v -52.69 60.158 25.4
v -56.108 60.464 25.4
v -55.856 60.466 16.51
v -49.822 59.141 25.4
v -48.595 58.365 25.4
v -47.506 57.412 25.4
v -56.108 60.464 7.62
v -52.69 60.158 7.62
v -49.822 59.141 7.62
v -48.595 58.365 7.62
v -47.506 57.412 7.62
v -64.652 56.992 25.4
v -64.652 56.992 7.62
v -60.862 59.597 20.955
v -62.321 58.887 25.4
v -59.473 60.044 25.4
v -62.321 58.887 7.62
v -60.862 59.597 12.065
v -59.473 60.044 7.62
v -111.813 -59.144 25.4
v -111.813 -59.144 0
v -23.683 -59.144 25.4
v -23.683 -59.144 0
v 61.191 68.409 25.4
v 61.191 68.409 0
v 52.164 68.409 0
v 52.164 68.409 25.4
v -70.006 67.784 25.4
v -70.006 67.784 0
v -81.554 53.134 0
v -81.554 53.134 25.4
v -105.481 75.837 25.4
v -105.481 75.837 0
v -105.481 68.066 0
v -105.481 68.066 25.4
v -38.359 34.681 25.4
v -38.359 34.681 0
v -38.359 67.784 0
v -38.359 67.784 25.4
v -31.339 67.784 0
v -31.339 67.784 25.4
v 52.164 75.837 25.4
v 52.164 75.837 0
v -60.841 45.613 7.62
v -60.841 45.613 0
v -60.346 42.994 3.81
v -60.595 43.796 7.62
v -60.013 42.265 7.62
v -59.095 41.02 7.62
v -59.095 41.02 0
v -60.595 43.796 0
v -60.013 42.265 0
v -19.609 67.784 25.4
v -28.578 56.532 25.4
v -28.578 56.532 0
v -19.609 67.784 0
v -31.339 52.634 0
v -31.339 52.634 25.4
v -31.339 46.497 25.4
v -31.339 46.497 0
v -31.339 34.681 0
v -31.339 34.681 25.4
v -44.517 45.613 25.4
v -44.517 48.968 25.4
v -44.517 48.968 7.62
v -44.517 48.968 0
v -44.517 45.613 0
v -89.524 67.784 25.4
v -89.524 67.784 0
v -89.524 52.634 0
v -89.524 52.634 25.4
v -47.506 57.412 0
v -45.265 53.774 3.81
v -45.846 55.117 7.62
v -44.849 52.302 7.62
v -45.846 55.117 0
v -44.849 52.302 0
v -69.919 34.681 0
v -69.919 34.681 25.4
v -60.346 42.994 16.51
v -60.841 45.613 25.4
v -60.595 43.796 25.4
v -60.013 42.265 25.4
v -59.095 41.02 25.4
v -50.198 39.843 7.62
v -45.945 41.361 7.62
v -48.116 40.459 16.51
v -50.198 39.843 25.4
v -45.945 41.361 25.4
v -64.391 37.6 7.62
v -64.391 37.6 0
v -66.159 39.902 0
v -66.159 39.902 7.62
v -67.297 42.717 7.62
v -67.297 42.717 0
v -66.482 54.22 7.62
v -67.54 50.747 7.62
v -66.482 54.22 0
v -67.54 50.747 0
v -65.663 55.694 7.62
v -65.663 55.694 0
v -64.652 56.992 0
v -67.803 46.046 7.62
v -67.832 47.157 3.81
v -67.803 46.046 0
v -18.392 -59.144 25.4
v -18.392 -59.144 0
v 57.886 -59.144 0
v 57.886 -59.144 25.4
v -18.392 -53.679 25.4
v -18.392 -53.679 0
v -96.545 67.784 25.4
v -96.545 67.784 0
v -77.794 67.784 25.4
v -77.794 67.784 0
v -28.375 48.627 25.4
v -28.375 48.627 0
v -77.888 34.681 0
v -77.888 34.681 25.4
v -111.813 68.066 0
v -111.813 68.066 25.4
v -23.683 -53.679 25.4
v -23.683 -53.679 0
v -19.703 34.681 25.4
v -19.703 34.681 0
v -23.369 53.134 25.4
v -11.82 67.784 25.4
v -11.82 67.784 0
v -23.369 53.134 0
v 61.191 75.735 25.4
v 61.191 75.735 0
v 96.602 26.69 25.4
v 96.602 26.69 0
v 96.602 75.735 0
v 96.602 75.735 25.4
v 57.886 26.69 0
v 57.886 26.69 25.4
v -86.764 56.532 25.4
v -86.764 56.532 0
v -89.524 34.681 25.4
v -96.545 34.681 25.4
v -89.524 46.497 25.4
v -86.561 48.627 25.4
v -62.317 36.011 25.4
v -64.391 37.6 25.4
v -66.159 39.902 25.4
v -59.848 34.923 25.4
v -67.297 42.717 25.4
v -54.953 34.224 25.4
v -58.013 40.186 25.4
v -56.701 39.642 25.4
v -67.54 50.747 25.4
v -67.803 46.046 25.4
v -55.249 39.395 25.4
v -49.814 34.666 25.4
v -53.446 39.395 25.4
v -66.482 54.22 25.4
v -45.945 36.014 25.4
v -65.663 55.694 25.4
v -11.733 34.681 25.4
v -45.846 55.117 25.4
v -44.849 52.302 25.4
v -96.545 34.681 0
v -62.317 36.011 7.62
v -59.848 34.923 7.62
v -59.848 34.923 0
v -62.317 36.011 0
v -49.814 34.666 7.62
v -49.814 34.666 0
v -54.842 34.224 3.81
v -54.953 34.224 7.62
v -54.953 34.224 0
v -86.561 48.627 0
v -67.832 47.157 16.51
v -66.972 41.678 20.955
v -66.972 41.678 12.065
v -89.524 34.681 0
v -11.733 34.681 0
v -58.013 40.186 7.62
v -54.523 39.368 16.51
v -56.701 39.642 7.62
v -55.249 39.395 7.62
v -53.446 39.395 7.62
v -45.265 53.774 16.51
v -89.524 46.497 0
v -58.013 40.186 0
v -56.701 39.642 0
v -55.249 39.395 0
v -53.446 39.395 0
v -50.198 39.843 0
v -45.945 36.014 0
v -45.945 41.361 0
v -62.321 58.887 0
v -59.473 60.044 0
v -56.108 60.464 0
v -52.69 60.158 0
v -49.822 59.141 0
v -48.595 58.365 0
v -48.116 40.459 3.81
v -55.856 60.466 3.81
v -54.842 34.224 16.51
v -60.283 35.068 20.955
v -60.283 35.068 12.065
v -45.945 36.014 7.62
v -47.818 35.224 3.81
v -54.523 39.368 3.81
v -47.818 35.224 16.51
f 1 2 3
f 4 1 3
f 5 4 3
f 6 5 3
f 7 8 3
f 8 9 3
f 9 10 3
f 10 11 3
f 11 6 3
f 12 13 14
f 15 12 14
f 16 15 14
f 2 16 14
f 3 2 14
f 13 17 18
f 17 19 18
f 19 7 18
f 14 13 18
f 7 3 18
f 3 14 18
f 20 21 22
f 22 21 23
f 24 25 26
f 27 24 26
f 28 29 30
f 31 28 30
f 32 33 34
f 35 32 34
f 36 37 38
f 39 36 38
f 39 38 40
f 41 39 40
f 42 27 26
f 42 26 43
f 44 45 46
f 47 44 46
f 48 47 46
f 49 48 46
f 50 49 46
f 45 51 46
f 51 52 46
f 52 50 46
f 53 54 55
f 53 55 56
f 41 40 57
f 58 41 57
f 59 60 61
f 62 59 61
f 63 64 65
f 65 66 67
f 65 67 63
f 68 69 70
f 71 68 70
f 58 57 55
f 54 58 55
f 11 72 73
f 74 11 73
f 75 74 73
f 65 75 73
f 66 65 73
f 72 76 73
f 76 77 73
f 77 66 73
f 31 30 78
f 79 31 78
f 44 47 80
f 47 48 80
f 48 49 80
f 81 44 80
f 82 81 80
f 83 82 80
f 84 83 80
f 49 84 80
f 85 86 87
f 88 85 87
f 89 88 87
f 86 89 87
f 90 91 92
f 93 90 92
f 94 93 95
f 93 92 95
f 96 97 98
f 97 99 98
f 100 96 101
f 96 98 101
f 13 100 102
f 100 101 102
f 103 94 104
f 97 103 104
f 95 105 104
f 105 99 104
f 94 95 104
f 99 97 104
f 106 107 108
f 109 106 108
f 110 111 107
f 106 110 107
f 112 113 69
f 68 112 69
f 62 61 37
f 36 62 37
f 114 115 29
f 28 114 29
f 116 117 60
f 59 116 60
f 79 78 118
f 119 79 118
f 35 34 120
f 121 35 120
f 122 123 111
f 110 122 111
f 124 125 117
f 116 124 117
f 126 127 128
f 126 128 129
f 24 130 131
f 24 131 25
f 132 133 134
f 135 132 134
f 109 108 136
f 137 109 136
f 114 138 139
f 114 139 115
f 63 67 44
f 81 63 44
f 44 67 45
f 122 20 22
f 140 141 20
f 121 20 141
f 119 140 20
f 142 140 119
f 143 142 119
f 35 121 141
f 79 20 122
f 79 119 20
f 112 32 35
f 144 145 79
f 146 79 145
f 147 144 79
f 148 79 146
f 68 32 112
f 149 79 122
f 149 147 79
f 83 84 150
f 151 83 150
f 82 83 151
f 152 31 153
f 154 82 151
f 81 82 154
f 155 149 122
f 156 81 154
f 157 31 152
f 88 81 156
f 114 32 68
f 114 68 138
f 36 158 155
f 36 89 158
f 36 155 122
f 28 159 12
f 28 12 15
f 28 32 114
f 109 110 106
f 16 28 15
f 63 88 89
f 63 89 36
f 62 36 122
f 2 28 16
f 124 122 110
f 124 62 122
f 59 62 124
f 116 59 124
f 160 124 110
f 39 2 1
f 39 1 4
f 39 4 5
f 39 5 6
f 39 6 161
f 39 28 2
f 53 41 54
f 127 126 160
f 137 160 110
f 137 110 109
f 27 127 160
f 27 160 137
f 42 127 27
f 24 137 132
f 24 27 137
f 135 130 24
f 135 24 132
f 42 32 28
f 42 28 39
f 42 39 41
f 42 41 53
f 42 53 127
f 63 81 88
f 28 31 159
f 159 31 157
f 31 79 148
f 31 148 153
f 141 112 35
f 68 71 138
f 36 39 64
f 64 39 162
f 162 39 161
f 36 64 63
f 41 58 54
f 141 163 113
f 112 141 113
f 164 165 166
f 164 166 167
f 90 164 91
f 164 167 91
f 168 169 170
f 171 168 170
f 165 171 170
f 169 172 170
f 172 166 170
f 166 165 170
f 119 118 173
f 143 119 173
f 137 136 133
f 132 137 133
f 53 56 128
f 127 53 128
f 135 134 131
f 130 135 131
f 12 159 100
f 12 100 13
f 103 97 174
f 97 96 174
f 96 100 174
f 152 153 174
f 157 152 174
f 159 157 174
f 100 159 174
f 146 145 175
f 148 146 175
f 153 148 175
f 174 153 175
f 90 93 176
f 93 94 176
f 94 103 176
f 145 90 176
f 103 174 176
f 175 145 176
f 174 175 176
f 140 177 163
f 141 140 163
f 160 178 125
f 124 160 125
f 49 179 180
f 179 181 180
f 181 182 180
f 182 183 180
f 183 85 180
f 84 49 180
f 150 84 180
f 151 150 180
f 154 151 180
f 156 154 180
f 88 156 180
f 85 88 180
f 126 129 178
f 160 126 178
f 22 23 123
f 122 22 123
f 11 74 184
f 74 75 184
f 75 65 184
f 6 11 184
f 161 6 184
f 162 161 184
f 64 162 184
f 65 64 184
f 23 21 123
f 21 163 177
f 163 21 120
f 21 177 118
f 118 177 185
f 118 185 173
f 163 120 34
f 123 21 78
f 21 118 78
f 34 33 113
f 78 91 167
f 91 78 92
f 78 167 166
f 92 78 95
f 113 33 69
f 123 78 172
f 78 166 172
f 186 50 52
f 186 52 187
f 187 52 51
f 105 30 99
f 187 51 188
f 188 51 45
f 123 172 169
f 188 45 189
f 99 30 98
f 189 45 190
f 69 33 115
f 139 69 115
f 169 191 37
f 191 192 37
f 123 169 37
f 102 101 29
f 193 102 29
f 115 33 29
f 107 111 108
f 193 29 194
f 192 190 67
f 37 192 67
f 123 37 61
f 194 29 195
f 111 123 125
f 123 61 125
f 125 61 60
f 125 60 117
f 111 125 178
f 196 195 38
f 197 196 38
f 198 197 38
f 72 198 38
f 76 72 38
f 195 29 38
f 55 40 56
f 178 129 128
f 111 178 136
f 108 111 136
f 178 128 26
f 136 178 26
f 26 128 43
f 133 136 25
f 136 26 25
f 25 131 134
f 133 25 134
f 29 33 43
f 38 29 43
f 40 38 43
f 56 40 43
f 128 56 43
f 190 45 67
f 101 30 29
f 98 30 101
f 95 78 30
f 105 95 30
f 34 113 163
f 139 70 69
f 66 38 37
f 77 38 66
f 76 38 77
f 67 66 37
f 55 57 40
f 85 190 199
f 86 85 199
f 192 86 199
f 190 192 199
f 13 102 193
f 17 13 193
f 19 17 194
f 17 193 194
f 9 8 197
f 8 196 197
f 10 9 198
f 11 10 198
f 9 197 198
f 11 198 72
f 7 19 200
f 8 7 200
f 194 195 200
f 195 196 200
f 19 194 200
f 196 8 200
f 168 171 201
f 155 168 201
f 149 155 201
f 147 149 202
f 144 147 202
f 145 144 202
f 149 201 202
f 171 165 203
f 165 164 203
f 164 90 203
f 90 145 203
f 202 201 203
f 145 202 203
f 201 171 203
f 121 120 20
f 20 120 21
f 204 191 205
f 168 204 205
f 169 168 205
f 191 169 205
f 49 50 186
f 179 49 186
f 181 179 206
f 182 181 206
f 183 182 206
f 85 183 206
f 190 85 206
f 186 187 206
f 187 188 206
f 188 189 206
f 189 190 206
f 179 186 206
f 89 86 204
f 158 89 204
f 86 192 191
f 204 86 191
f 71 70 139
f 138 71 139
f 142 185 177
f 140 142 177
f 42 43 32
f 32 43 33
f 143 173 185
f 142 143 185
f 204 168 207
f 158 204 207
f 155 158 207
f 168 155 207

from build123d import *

# Parameters (mm, degrees)
F1_DEPTH = 7.62
F2_DEPTH = 25.4


with BuildPart() as f1:
    # F0 (on Top) → F1 (new body)
    with BuildSketch(Plane.XY):
        Polygon((-105.48081249, 68.0660605431), (-111.8125319481, 68.0660605431), (-111.8125319481, -59.1440834105), (-23.6834976822, -59.1440834105), (-23.6834976822, -53.6785013974), (-18.3922555298, -53.6785013974), (-18.3922555298, -59.1440834105), (57.8856468201, -59.1440834105), (57.8856468201, 26.6896747053), (96.6019257903, 26.6896747053), (96.6019257903, 75.7354423404), (61.1912831664, 75.7354423404), (61.1912831664, 68.4091001749), (52.1640814841, 68.4091001749), (52.1640814841, 75.83681494), (-105.48081249, 75.83681494), align=None)
        Polygon((-81.554395719, 53.1338888759), (-69.9187490924, 34.6805937588), (-77.8883700696, 34.6805937588), (-86.5607667147, 48.6274304688), (-89.5240166962, 46.4973681349), (-89.5240166962, 34.6805937588), (-96.544528266, 34.6805937588), (-96.544528266, 67.7835012539), (-89.5240166962, 67.7835012539), (-89.5240166962, 52.6339762873), (-86.7636297941, 56.5318454561), (-77.7941836398, 67.7835012539), (-70.0056904122, 67.7835012539), align=None, mode=Mode.SUBTRACT)
        with BuildLine():
            add(Edge.make_bspline(
                [(-49.8135689001, 34.6661035389), (-51.8711801342, 34.2241518301), (-54.8416752257, 34.2241518301)],
                knots=[0, 0, 0, 1, 1, 1], degree=2))
            add(Edge.make_bspline(
                [(-54.8416752257, 34.2241518301), (-60.9493029381, 34.2241518301), (-64.3907301783, 37.6003730804)],
                knots=[0, 0, 0, 1, 1, 1], degree=2))
            add(Edge.make_bspline(
                [(-64.3907301783, 37.6003730804), (-67.8321574184, 40.9765943308), (-67.8321574184, 47.156673143)],
                knots=[0, 0, 0, 1, 1, 1], degree=2))
            add(Edge.make_bspline(
                [(-67.8321574184, 47.156673143), (-67.8321574184, 53.5178797048), (-64.6515541375, 56.9919099398)],
                knots=[0, 0, 0, 1, 1, 1], degree=2))
            add(Edge.make_bspline(
                [(-64.6515541375, 56.9919099398), (-61.4709508566, 60.4659401749), (-55.8559906228, 60.4659401749)],
                knots=[0, 0, 0, 1, 1, 1], degree=2))
            add(Edge.make_bspline(
                [(-55.8559906228, 60.4659401749), (-50.4946092381, 60.4659401749), (-47.5060013717, 57.4121263186)],
                knots=[0, 0, 0, 1, 1, 1], degree=2))
            add(Edge.make_bspline(
                [(-47.5060013717, 57.4121263186), (-44.5173935053, 54.3583124624), (-44.5173935053, 48.9679506378)],
                knots=[0, 0, 0, 1, 1, 1], degree=2))
            Line((-44.5173935053, 48.9679506378), (-44.5173935053, 45.6134647175))
            Line((-44.5173935053, 45.6134647175), (-60.8406262885, 45.6134647175))
            add(Edge.make_bspline(
                [(-60.8406262885, 45.6134647175), (-60.7247045288, 42.6719500659), (-59.0945547835, 41.0200649906)],
                knots=[0, 0, 0, 1, 1, 1], degree=2))
            add(Edge.make_bspline(
                [(-59.0945547835, 41.0200649906), (-57.4644050381, 39.3681799154), (-54.5228903866, 39.3681799154)],
                knots=[0, 0, 0, 1, 1, 1], degree=2))
            add(Edge.make_bspline(
                [(-54.5228903866, 39.3681799154), (-52.2334356331, 39.3681799154), (-50.197559729, 39.842734619)],
                knots=[0, 0, 0, 1, 1, 1], degree=2))
            add(Edge.make_bspline(
                [(-50.197559729, 39.842734619), (-48.1616838248, 40.3172893227), (-45.9446801712, 41.3605851597)],
                knots=[0, 0, 0, 1, 1, 1], degree=2))
            Line((-45.9446801712, 41.3605851597), (-45.9446801712, 36.013693995))
            add(Edge.make_bspline(
                [(-45.9446801712, 36.013693995), (-47.755957666, 35.1080552476), (-49.8135689001, 34.6661035389)],
                knots=[0, 0, 0, 1, 1, 1], degree=2))
        make_face(mode=Mode.SUBTRACT)
        Polygon((-23.3689174759, 53.1338888759), (-11.7332708493, 34.6805937588), (-19.7028918265, 34.6805937588), (-28.3752884716, 48.6274304688), (-31.3385384531, 46.4973681349), (-31.3385384531, 34.6805937588), (-38.3590500229, 34.6805937588), (-38.3590500229, 67.7835012539), (-31.3385384531, 67.7835012539), (-31.3385384531, 52.6339762873), (-28.578151551, 56.5318454561), (-19.6087053967, 67.7835012539), (-11.8202121691, 67.7835012539), align=None, mode=Mode.SUBTRACT)
    extrude(amount=F1_DEPTH)

    # F0 (on Top) → F2 (join)
    with BuildSketch(Plane.XY):
        Polygon((-105.48081249, 68.0660605431), (-111.8125319481, 68.0660605431), (-111.8125319481, -59.1440834105), (-23.6834976822, -59.1440834105), (-23.6834976822, -53.6785013974), (-18.3922555298, -53.6785013974), (-18.3922555298, -59.1440834105), (57.8856468201, -59.1440834105), (57.8856468201, 26.6896747053), (96.6019257903, 26.6896747053), (96.6019257903, 75.7354423404), (61.1912831664, 75.7354423404), (61.1912831664, 68.4091001749), (52.1640814841, 68.4091001749), (52.1640814841, 75.83681494), (-105.48081249, 75.83681494), align=None)
        Polygon((-81.554395719, 53.1338888759), (-69.9187490924, 34.6805937588), (-77.8883700696, 34.6805937588), (-86.5607667147, 48.6274304688), (-89.5240166962, 46.4973681349), (-89.5240166962, 34.6805937588), (-96.544528266, 34.6805937588), (-96.544528266, 67.7835012539), (-89.5240166962, 67.7835012539), (-89.5240166962, 52.6339762873), (-86.7636297941, 56.5318454561), (-77.7941836398, 67.7835012539), (-70.0056904122, 67.7835012539), align=None, mode=Mode.SUBTRACT)
        with BuildLine():
            add(Edge.make_bspline(
                [(-49.8135689001, 34.6661035389), (-51.8711801342, 34.2241518301), (-54.8416752257, 34.2241518301)],
                knots=[0, 0, 0, 1, 1, 1], degree=2))
            add(Edge.make_bspline(
                [(-54.8416752257, 34.2241518301), (-60.9493029381, 34.2241518301), (-64.3907301783, 37.6003730804)],
                knots=[0, 0, 0, 1, 1, 1], degree=2))
            add(Edge.make_bspline(
                [(-64.3907301783, 37.6003730804), (-67.8321574184, 40.9765943308), (-67.8321574184, 47.156673143)],
                knots=[0, 0, 0, 1, 1, 1], degree=2))
            add(Edge.make_bspline(
                [(-67.8321574184, 47.156673143), (-67.8321574184, 53.5178797048), (-64.6515541375, 56.9919099398)],
                knots=[0, 0, 0, 1, 1, 1], degree=2))
            add(Edge.make_bspline(
                [(-64.6515541375, 56.9919099398), (-61.4709508566, 60.4659401749), (-55.8559906228, 60.4659401749)],
                knots=[0, 0, 0, 1, 1, 1], degree=2))
            add(Edge.make_bspline(
                [(-55.8559906228, 60.4659401749), (-50.4946092381, 60.4659401749), (-47.5060013717, 57.4121263186)],
                knots=[0, 0, 0, 1, 1, 1], degree=2))
            add(Edge.make_bspline(
                [(-47.5060013717, 57.4121263186), (-44.5173935053, 54.3583124624), (-44.5173935053, 48.9679506378)],
                knots=[0, 0, 0, 1, 1, 1], degree=2))
            Line((-44.5173935053, 48.9679506378), (-44.5173935053, 45.6134647175))
            Line((-44.5173935053, 45.6134647175), (-60.8406262885, 45.6134647175))
            add(Edge.make_bspline(
                [(-60.8406262885, 45.6134647175), (-60.7247045288, 42.6719500659), (-59.0945547835, 41.0200649906)],
                knots=[0, 0, 0, 1, 1, 1], degree=2))
            add(Edge.make_bspline(
                [(-59.0945547835, 41.0200649906), (-57.4644050381, 39.3681799154), (-54.5228903866, 39.3681799154)],
                knots=[0, 0, 0, 1, 1, 1], degree=2))
            add(Edge.make_bspline(
                [(-54.5228903866, 39.3681799154), (-52.2334356331, 39.3681799154), (-50.197559729, 39.842734619)],
                knots=[0, 0, 0, 1, 1, 1], degree=2))
            add(Edge.make_bspline(
                [(-50.197559729, 39.842734619), (-48.1616838248, 40.3172893227), (-45.9446801712, 41.3605851597)],
                knots=[0, 0, 0, 1, 1, 1], degree=2))
            Line((-45.9446801712, 41.3605851597), (-45.9446801712, 36.013693995))
            add(Edge.make_bspline(
                [(-45.9446801712, 36.013693995), (-47.755957666, 35.1080552476), (-49.8135689001, 34.6661035389)],
                knots=[0, 0, 0, 1, 1, 1], degree=2))
        make_face(mode=Mode.SUBTRACT)
        Polygon((-23.3689174759, 53.1338888759), (-11.7332708493, 34.6805937588), (-19.7028918265, 34.6805937588), (-28.3752884716, 48.6274304688), (-31.3385384531, 46.4973681349), (-31.3385384531, 34.6805937588), (-38.3590500229, 34.6805937588), (-38.3590500229, 67.7835012539), (-31.3385384531, 67.7835012539), (-31.3385384531, 52.6339762873), (-28.578151551, 56.5318454561), (-19.6087053967, 67.7835012539), (-11.8202121691, 67.7835012539), align=None, mode=Mode.SUBTRACT)
    extrude(amount=F2_DEPTH)


solid = f1.part
